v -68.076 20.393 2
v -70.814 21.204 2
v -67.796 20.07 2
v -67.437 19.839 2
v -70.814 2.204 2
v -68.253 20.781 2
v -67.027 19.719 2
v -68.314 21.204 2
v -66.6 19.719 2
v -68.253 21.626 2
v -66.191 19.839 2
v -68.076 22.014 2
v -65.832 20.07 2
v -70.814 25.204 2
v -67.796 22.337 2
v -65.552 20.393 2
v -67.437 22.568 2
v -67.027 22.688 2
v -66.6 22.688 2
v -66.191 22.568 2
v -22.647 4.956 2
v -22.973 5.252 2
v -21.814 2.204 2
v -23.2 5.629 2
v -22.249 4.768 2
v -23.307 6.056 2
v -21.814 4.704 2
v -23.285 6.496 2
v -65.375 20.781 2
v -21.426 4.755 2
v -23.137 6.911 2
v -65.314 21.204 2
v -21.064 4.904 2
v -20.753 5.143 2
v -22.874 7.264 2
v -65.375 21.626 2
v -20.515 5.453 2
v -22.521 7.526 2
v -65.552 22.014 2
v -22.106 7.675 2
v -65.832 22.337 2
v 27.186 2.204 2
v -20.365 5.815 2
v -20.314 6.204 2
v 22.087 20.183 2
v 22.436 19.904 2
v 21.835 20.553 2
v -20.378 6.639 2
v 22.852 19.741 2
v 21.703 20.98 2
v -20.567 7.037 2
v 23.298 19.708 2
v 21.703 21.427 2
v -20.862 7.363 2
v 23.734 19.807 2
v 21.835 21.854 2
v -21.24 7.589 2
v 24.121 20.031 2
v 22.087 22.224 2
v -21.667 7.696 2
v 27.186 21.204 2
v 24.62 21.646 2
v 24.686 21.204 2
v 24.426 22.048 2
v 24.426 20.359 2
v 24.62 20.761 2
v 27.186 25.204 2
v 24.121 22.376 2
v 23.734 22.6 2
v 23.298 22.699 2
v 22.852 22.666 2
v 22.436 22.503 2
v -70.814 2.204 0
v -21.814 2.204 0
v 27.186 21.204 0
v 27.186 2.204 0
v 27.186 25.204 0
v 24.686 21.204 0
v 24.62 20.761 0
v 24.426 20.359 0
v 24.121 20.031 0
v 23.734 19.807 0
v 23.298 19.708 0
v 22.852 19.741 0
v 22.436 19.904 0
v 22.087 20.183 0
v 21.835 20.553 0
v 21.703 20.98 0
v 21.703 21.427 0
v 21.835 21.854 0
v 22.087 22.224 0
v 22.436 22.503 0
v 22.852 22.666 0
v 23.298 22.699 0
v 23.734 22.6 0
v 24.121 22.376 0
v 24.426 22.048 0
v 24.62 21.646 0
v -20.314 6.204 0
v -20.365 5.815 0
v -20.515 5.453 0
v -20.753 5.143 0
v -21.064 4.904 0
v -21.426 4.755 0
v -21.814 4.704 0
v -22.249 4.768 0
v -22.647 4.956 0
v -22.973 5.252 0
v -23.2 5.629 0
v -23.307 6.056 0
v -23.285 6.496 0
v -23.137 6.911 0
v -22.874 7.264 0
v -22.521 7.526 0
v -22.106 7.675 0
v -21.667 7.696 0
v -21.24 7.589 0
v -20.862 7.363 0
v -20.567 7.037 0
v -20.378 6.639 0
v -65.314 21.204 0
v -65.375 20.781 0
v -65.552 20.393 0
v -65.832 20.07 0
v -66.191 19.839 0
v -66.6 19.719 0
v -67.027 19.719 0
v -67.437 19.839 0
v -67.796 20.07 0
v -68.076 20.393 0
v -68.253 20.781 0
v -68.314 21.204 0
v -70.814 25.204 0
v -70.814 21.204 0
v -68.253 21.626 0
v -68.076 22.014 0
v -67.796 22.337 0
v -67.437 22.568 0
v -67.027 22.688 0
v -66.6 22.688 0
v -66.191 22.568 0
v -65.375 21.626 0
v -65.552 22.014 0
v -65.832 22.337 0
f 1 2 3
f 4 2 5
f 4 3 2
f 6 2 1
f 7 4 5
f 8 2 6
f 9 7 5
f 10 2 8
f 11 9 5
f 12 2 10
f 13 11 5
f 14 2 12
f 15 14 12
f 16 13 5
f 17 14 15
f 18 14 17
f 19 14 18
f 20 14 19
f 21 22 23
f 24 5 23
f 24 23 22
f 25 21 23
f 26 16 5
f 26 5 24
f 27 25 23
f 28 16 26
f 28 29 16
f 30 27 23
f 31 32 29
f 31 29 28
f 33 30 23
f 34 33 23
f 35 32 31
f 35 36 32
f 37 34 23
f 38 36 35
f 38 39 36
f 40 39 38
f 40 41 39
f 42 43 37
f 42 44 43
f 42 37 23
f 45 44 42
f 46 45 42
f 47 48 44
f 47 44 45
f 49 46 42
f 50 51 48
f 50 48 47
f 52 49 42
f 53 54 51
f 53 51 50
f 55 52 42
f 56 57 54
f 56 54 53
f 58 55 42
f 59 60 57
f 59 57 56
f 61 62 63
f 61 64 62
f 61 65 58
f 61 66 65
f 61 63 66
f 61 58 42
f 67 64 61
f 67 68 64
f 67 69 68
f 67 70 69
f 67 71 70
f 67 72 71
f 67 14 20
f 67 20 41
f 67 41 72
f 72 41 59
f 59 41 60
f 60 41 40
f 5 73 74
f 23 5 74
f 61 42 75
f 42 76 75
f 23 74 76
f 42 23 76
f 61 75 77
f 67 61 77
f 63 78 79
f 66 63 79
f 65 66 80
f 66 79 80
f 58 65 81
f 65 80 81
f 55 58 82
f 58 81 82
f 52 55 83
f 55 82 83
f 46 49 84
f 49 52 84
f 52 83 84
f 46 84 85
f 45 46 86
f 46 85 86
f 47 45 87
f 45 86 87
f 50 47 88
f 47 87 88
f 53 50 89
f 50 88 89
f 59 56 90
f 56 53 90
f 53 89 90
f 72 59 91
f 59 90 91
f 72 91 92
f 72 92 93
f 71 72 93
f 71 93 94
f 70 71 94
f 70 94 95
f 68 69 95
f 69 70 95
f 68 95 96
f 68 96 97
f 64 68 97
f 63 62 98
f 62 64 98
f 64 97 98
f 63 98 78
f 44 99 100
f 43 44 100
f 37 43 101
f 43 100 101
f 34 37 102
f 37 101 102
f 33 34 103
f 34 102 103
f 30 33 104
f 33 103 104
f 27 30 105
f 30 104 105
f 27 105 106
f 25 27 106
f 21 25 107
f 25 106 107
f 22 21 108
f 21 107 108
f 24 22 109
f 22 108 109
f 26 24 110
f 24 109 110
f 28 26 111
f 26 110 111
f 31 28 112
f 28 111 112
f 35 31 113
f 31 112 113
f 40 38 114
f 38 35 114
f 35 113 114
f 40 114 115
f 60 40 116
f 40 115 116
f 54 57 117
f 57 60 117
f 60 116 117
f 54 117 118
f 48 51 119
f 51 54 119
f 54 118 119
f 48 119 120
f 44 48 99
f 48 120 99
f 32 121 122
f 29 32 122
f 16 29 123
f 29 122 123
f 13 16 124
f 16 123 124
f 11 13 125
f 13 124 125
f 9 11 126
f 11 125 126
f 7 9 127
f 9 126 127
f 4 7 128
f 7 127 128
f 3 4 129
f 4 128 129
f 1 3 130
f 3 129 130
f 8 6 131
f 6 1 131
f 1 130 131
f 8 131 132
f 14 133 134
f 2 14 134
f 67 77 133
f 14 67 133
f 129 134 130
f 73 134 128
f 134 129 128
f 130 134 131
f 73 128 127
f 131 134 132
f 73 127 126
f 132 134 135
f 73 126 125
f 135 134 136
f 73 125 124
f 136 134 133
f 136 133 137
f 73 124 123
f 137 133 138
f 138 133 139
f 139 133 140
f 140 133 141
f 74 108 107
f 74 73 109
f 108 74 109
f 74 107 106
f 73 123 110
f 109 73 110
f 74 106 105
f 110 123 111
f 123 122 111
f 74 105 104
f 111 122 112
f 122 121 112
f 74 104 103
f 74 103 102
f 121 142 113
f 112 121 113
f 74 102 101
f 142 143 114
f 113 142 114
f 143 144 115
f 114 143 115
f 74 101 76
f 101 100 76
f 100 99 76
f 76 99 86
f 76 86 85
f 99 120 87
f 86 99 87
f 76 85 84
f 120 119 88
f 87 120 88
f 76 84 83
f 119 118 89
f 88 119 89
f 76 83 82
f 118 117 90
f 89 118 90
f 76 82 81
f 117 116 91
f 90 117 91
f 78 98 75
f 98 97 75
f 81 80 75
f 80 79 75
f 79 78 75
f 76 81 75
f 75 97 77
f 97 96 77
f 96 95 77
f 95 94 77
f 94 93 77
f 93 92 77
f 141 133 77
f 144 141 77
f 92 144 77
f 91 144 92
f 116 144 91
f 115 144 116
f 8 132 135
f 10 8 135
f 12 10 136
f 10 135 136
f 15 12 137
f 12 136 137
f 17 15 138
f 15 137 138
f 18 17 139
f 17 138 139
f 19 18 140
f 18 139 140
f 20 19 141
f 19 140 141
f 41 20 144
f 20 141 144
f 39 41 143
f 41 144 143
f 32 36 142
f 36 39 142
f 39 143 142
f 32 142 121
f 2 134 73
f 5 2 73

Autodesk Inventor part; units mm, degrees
ref_plane "YZ Plane" through (0, 0, 0) normal (1, 0, 0) x (0, 1, 0)
ref_plane "XZ Plane" through (0, 0, 0) normal (0, 1, 0) x (-1, 0, 0)
ref_plane "XY Plane" through (0, 0, 0) normal (0, 0, 1) x (1, 0, 0)
sketch "Sketch1" plane through (0, 0, 0) normal (0, 0, 1) x (1, 0, 0)
  line L0 (27.1862, 25.2035) -> (-70.8138, 25.2035)
  line L1 (-70.8138, 25.2035) -> (-70.8138, 2.2035)
  line L2 (-70.8138, 2.2035) -> (27.1862, 2.2035)
  line L3 (27.1862, 2.2035) -> (27.1862, 25.2035)
  line L4 (27.1862, 25.2035) -> (27.1862, 21.2035)
  line L5 (27.1862, 21.2035) -> (23.1862, 21.2035)
  circle A0 centre (23.1862, 21.2035) radius 1.5
  line L6 (-70.8138, 25.2035) -> (-70.8138, 21.2035)
  line L7 (-70.8138, 21.2035) -> (-66.8138, 21.2035)
  circle A1 centre (-66.8138, 21.2035) radius 1.5
  line L8 (-21.8138, 2.2035) -> (-21.8138, 6.2035)
  circle A2 centre (-21.8138, 6.2035) radius 1.5
  point P0 (0, 0)
  dimension "d0" = 98
  dimension "d1" = 23
  dimension "d2" = 4
  dimension "d3" = 4
  dimension "d4" = 3
  dimension "d5" = 4
  dimension "d6" = 4
  dimension "d7" = 3
  dimension "d8" = 4
  dimension "d9" = 3
extrude "Extrusion1" add sketch "Sketch1" along normal blind 2
properties part number "konektor kort"
